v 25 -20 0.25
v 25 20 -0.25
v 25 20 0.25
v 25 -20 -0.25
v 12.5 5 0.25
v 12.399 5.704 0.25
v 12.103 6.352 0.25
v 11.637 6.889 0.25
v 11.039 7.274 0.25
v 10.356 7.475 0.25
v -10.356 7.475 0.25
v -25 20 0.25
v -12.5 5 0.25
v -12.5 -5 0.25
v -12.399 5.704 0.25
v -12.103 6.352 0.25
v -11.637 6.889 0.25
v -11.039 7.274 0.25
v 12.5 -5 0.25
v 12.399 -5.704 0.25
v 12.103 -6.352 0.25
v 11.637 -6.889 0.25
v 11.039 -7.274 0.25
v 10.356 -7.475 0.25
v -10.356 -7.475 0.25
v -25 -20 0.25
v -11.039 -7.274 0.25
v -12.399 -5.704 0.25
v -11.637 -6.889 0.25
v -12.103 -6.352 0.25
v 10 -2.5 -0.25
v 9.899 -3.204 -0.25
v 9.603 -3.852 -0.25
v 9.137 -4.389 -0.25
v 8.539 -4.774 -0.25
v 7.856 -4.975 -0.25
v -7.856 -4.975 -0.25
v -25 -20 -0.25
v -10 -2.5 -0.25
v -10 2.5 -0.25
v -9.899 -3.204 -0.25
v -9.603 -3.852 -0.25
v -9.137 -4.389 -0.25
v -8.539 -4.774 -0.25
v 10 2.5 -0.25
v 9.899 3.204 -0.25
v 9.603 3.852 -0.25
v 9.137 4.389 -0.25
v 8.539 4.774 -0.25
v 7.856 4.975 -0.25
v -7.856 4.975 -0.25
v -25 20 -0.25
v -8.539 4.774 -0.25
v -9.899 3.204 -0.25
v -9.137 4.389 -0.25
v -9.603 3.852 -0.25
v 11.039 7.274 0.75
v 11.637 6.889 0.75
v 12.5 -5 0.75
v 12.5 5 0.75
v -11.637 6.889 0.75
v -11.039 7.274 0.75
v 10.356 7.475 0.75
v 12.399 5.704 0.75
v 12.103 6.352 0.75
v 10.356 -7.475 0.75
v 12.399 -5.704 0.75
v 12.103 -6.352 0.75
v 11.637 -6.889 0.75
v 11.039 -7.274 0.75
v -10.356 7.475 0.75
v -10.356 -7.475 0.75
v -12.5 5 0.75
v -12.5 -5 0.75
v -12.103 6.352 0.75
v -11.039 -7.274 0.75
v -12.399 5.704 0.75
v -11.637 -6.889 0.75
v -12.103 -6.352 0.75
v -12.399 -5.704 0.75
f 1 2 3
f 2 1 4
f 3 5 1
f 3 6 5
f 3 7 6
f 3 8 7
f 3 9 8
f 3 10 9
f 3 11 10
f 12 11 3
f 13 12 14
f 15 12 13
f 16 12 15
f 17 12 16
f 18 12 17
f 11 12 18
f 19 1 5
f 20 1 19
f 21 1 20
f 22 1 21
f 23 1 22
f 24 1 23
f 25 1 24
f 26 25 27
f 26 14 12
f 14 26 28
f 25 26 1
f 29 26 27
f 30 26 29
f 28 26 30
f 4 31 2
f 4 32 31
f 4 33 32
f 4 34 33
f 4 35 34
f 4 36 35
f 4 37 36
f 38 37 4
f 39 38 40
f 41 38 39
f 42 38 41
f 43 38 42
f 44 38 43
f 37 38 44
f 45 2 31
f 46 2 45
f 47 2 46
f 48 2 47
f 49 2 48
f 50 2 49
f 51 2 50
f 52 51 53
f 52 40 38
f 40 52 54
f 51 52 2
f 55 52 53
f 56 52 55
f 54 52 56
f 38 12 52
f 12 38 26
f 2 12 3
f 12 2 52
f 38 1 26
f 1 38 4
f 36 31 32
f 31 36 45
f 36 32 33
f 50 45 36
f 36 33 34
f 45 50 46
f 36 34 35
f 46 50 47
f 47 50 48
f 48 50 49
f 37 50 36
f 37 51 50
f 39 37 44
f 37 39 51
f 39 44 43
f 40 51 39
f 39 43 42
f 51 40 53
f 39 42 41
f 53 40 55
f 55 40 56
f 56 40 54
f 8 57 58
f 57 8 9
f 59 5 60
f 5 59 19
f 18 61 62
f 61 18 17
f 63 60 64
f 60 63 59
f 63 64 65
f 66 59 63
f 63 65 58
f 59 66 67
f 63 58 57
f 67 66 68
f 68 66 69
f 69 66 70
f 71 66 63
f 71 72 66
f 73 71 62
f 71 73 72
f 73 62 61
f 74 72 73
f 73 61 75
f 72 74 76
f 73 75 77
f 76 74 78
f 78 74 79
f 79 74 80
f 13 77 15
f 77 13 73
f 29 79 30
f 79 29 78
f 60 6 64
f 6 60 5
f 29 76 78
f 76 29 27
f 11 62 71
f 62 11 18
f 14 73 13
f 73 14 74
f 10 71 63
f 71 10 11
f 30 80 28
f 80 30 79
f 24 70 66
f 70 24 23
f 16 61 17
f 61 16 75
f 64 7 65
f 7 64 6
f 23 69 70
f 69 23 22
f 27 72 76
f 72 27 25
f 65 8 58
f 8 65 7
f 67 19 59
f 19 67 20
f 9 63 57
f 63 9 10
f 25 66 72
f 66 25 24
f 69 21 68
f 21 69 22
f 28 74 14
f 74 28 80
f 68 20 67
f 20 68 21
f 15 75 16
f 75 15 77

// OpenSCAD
plywood_t = 0.5;
shoulder = 2.5;

module playwood_piece(length=30, width=20, thickness=plywood_t)
{
    rounded_end_d = 5;
    
    minkowski()
    {
        cube([length-rounded_end_d, width-rounded_end_d, 0.001], center = true);
        cylinder(d=rounded_end_d,h=thickness, center=true, $fn = 22);
    }
}

module playwood_plug(length=30, width=20, offs = 0)
{
    playwood_piece(length, width, plywood_t);
    translate([0,0,plywood_t+(offs>0?offs:0)])
    playwood_piece(length+2*shoulder, width+2*shoulder, plywood_t);
    
}

module ceiling(length=30, width=10)
{
    color([0.7,0.7,0.7,1.0]) difference() 
    {
        cube([50, 40, plywood_t], center = true);
        playwood_piece(length, width, 1.5*plywood_t);
    }
}


module demo(length=20, width=10)
{
    ceiling(length, width);
    pos = $t > 0.5 ? 15*(1-$t) : 0;
    translate([0,0,pos]) 
    playwood_plug(length, width, pos-5.8);
}

demo();
